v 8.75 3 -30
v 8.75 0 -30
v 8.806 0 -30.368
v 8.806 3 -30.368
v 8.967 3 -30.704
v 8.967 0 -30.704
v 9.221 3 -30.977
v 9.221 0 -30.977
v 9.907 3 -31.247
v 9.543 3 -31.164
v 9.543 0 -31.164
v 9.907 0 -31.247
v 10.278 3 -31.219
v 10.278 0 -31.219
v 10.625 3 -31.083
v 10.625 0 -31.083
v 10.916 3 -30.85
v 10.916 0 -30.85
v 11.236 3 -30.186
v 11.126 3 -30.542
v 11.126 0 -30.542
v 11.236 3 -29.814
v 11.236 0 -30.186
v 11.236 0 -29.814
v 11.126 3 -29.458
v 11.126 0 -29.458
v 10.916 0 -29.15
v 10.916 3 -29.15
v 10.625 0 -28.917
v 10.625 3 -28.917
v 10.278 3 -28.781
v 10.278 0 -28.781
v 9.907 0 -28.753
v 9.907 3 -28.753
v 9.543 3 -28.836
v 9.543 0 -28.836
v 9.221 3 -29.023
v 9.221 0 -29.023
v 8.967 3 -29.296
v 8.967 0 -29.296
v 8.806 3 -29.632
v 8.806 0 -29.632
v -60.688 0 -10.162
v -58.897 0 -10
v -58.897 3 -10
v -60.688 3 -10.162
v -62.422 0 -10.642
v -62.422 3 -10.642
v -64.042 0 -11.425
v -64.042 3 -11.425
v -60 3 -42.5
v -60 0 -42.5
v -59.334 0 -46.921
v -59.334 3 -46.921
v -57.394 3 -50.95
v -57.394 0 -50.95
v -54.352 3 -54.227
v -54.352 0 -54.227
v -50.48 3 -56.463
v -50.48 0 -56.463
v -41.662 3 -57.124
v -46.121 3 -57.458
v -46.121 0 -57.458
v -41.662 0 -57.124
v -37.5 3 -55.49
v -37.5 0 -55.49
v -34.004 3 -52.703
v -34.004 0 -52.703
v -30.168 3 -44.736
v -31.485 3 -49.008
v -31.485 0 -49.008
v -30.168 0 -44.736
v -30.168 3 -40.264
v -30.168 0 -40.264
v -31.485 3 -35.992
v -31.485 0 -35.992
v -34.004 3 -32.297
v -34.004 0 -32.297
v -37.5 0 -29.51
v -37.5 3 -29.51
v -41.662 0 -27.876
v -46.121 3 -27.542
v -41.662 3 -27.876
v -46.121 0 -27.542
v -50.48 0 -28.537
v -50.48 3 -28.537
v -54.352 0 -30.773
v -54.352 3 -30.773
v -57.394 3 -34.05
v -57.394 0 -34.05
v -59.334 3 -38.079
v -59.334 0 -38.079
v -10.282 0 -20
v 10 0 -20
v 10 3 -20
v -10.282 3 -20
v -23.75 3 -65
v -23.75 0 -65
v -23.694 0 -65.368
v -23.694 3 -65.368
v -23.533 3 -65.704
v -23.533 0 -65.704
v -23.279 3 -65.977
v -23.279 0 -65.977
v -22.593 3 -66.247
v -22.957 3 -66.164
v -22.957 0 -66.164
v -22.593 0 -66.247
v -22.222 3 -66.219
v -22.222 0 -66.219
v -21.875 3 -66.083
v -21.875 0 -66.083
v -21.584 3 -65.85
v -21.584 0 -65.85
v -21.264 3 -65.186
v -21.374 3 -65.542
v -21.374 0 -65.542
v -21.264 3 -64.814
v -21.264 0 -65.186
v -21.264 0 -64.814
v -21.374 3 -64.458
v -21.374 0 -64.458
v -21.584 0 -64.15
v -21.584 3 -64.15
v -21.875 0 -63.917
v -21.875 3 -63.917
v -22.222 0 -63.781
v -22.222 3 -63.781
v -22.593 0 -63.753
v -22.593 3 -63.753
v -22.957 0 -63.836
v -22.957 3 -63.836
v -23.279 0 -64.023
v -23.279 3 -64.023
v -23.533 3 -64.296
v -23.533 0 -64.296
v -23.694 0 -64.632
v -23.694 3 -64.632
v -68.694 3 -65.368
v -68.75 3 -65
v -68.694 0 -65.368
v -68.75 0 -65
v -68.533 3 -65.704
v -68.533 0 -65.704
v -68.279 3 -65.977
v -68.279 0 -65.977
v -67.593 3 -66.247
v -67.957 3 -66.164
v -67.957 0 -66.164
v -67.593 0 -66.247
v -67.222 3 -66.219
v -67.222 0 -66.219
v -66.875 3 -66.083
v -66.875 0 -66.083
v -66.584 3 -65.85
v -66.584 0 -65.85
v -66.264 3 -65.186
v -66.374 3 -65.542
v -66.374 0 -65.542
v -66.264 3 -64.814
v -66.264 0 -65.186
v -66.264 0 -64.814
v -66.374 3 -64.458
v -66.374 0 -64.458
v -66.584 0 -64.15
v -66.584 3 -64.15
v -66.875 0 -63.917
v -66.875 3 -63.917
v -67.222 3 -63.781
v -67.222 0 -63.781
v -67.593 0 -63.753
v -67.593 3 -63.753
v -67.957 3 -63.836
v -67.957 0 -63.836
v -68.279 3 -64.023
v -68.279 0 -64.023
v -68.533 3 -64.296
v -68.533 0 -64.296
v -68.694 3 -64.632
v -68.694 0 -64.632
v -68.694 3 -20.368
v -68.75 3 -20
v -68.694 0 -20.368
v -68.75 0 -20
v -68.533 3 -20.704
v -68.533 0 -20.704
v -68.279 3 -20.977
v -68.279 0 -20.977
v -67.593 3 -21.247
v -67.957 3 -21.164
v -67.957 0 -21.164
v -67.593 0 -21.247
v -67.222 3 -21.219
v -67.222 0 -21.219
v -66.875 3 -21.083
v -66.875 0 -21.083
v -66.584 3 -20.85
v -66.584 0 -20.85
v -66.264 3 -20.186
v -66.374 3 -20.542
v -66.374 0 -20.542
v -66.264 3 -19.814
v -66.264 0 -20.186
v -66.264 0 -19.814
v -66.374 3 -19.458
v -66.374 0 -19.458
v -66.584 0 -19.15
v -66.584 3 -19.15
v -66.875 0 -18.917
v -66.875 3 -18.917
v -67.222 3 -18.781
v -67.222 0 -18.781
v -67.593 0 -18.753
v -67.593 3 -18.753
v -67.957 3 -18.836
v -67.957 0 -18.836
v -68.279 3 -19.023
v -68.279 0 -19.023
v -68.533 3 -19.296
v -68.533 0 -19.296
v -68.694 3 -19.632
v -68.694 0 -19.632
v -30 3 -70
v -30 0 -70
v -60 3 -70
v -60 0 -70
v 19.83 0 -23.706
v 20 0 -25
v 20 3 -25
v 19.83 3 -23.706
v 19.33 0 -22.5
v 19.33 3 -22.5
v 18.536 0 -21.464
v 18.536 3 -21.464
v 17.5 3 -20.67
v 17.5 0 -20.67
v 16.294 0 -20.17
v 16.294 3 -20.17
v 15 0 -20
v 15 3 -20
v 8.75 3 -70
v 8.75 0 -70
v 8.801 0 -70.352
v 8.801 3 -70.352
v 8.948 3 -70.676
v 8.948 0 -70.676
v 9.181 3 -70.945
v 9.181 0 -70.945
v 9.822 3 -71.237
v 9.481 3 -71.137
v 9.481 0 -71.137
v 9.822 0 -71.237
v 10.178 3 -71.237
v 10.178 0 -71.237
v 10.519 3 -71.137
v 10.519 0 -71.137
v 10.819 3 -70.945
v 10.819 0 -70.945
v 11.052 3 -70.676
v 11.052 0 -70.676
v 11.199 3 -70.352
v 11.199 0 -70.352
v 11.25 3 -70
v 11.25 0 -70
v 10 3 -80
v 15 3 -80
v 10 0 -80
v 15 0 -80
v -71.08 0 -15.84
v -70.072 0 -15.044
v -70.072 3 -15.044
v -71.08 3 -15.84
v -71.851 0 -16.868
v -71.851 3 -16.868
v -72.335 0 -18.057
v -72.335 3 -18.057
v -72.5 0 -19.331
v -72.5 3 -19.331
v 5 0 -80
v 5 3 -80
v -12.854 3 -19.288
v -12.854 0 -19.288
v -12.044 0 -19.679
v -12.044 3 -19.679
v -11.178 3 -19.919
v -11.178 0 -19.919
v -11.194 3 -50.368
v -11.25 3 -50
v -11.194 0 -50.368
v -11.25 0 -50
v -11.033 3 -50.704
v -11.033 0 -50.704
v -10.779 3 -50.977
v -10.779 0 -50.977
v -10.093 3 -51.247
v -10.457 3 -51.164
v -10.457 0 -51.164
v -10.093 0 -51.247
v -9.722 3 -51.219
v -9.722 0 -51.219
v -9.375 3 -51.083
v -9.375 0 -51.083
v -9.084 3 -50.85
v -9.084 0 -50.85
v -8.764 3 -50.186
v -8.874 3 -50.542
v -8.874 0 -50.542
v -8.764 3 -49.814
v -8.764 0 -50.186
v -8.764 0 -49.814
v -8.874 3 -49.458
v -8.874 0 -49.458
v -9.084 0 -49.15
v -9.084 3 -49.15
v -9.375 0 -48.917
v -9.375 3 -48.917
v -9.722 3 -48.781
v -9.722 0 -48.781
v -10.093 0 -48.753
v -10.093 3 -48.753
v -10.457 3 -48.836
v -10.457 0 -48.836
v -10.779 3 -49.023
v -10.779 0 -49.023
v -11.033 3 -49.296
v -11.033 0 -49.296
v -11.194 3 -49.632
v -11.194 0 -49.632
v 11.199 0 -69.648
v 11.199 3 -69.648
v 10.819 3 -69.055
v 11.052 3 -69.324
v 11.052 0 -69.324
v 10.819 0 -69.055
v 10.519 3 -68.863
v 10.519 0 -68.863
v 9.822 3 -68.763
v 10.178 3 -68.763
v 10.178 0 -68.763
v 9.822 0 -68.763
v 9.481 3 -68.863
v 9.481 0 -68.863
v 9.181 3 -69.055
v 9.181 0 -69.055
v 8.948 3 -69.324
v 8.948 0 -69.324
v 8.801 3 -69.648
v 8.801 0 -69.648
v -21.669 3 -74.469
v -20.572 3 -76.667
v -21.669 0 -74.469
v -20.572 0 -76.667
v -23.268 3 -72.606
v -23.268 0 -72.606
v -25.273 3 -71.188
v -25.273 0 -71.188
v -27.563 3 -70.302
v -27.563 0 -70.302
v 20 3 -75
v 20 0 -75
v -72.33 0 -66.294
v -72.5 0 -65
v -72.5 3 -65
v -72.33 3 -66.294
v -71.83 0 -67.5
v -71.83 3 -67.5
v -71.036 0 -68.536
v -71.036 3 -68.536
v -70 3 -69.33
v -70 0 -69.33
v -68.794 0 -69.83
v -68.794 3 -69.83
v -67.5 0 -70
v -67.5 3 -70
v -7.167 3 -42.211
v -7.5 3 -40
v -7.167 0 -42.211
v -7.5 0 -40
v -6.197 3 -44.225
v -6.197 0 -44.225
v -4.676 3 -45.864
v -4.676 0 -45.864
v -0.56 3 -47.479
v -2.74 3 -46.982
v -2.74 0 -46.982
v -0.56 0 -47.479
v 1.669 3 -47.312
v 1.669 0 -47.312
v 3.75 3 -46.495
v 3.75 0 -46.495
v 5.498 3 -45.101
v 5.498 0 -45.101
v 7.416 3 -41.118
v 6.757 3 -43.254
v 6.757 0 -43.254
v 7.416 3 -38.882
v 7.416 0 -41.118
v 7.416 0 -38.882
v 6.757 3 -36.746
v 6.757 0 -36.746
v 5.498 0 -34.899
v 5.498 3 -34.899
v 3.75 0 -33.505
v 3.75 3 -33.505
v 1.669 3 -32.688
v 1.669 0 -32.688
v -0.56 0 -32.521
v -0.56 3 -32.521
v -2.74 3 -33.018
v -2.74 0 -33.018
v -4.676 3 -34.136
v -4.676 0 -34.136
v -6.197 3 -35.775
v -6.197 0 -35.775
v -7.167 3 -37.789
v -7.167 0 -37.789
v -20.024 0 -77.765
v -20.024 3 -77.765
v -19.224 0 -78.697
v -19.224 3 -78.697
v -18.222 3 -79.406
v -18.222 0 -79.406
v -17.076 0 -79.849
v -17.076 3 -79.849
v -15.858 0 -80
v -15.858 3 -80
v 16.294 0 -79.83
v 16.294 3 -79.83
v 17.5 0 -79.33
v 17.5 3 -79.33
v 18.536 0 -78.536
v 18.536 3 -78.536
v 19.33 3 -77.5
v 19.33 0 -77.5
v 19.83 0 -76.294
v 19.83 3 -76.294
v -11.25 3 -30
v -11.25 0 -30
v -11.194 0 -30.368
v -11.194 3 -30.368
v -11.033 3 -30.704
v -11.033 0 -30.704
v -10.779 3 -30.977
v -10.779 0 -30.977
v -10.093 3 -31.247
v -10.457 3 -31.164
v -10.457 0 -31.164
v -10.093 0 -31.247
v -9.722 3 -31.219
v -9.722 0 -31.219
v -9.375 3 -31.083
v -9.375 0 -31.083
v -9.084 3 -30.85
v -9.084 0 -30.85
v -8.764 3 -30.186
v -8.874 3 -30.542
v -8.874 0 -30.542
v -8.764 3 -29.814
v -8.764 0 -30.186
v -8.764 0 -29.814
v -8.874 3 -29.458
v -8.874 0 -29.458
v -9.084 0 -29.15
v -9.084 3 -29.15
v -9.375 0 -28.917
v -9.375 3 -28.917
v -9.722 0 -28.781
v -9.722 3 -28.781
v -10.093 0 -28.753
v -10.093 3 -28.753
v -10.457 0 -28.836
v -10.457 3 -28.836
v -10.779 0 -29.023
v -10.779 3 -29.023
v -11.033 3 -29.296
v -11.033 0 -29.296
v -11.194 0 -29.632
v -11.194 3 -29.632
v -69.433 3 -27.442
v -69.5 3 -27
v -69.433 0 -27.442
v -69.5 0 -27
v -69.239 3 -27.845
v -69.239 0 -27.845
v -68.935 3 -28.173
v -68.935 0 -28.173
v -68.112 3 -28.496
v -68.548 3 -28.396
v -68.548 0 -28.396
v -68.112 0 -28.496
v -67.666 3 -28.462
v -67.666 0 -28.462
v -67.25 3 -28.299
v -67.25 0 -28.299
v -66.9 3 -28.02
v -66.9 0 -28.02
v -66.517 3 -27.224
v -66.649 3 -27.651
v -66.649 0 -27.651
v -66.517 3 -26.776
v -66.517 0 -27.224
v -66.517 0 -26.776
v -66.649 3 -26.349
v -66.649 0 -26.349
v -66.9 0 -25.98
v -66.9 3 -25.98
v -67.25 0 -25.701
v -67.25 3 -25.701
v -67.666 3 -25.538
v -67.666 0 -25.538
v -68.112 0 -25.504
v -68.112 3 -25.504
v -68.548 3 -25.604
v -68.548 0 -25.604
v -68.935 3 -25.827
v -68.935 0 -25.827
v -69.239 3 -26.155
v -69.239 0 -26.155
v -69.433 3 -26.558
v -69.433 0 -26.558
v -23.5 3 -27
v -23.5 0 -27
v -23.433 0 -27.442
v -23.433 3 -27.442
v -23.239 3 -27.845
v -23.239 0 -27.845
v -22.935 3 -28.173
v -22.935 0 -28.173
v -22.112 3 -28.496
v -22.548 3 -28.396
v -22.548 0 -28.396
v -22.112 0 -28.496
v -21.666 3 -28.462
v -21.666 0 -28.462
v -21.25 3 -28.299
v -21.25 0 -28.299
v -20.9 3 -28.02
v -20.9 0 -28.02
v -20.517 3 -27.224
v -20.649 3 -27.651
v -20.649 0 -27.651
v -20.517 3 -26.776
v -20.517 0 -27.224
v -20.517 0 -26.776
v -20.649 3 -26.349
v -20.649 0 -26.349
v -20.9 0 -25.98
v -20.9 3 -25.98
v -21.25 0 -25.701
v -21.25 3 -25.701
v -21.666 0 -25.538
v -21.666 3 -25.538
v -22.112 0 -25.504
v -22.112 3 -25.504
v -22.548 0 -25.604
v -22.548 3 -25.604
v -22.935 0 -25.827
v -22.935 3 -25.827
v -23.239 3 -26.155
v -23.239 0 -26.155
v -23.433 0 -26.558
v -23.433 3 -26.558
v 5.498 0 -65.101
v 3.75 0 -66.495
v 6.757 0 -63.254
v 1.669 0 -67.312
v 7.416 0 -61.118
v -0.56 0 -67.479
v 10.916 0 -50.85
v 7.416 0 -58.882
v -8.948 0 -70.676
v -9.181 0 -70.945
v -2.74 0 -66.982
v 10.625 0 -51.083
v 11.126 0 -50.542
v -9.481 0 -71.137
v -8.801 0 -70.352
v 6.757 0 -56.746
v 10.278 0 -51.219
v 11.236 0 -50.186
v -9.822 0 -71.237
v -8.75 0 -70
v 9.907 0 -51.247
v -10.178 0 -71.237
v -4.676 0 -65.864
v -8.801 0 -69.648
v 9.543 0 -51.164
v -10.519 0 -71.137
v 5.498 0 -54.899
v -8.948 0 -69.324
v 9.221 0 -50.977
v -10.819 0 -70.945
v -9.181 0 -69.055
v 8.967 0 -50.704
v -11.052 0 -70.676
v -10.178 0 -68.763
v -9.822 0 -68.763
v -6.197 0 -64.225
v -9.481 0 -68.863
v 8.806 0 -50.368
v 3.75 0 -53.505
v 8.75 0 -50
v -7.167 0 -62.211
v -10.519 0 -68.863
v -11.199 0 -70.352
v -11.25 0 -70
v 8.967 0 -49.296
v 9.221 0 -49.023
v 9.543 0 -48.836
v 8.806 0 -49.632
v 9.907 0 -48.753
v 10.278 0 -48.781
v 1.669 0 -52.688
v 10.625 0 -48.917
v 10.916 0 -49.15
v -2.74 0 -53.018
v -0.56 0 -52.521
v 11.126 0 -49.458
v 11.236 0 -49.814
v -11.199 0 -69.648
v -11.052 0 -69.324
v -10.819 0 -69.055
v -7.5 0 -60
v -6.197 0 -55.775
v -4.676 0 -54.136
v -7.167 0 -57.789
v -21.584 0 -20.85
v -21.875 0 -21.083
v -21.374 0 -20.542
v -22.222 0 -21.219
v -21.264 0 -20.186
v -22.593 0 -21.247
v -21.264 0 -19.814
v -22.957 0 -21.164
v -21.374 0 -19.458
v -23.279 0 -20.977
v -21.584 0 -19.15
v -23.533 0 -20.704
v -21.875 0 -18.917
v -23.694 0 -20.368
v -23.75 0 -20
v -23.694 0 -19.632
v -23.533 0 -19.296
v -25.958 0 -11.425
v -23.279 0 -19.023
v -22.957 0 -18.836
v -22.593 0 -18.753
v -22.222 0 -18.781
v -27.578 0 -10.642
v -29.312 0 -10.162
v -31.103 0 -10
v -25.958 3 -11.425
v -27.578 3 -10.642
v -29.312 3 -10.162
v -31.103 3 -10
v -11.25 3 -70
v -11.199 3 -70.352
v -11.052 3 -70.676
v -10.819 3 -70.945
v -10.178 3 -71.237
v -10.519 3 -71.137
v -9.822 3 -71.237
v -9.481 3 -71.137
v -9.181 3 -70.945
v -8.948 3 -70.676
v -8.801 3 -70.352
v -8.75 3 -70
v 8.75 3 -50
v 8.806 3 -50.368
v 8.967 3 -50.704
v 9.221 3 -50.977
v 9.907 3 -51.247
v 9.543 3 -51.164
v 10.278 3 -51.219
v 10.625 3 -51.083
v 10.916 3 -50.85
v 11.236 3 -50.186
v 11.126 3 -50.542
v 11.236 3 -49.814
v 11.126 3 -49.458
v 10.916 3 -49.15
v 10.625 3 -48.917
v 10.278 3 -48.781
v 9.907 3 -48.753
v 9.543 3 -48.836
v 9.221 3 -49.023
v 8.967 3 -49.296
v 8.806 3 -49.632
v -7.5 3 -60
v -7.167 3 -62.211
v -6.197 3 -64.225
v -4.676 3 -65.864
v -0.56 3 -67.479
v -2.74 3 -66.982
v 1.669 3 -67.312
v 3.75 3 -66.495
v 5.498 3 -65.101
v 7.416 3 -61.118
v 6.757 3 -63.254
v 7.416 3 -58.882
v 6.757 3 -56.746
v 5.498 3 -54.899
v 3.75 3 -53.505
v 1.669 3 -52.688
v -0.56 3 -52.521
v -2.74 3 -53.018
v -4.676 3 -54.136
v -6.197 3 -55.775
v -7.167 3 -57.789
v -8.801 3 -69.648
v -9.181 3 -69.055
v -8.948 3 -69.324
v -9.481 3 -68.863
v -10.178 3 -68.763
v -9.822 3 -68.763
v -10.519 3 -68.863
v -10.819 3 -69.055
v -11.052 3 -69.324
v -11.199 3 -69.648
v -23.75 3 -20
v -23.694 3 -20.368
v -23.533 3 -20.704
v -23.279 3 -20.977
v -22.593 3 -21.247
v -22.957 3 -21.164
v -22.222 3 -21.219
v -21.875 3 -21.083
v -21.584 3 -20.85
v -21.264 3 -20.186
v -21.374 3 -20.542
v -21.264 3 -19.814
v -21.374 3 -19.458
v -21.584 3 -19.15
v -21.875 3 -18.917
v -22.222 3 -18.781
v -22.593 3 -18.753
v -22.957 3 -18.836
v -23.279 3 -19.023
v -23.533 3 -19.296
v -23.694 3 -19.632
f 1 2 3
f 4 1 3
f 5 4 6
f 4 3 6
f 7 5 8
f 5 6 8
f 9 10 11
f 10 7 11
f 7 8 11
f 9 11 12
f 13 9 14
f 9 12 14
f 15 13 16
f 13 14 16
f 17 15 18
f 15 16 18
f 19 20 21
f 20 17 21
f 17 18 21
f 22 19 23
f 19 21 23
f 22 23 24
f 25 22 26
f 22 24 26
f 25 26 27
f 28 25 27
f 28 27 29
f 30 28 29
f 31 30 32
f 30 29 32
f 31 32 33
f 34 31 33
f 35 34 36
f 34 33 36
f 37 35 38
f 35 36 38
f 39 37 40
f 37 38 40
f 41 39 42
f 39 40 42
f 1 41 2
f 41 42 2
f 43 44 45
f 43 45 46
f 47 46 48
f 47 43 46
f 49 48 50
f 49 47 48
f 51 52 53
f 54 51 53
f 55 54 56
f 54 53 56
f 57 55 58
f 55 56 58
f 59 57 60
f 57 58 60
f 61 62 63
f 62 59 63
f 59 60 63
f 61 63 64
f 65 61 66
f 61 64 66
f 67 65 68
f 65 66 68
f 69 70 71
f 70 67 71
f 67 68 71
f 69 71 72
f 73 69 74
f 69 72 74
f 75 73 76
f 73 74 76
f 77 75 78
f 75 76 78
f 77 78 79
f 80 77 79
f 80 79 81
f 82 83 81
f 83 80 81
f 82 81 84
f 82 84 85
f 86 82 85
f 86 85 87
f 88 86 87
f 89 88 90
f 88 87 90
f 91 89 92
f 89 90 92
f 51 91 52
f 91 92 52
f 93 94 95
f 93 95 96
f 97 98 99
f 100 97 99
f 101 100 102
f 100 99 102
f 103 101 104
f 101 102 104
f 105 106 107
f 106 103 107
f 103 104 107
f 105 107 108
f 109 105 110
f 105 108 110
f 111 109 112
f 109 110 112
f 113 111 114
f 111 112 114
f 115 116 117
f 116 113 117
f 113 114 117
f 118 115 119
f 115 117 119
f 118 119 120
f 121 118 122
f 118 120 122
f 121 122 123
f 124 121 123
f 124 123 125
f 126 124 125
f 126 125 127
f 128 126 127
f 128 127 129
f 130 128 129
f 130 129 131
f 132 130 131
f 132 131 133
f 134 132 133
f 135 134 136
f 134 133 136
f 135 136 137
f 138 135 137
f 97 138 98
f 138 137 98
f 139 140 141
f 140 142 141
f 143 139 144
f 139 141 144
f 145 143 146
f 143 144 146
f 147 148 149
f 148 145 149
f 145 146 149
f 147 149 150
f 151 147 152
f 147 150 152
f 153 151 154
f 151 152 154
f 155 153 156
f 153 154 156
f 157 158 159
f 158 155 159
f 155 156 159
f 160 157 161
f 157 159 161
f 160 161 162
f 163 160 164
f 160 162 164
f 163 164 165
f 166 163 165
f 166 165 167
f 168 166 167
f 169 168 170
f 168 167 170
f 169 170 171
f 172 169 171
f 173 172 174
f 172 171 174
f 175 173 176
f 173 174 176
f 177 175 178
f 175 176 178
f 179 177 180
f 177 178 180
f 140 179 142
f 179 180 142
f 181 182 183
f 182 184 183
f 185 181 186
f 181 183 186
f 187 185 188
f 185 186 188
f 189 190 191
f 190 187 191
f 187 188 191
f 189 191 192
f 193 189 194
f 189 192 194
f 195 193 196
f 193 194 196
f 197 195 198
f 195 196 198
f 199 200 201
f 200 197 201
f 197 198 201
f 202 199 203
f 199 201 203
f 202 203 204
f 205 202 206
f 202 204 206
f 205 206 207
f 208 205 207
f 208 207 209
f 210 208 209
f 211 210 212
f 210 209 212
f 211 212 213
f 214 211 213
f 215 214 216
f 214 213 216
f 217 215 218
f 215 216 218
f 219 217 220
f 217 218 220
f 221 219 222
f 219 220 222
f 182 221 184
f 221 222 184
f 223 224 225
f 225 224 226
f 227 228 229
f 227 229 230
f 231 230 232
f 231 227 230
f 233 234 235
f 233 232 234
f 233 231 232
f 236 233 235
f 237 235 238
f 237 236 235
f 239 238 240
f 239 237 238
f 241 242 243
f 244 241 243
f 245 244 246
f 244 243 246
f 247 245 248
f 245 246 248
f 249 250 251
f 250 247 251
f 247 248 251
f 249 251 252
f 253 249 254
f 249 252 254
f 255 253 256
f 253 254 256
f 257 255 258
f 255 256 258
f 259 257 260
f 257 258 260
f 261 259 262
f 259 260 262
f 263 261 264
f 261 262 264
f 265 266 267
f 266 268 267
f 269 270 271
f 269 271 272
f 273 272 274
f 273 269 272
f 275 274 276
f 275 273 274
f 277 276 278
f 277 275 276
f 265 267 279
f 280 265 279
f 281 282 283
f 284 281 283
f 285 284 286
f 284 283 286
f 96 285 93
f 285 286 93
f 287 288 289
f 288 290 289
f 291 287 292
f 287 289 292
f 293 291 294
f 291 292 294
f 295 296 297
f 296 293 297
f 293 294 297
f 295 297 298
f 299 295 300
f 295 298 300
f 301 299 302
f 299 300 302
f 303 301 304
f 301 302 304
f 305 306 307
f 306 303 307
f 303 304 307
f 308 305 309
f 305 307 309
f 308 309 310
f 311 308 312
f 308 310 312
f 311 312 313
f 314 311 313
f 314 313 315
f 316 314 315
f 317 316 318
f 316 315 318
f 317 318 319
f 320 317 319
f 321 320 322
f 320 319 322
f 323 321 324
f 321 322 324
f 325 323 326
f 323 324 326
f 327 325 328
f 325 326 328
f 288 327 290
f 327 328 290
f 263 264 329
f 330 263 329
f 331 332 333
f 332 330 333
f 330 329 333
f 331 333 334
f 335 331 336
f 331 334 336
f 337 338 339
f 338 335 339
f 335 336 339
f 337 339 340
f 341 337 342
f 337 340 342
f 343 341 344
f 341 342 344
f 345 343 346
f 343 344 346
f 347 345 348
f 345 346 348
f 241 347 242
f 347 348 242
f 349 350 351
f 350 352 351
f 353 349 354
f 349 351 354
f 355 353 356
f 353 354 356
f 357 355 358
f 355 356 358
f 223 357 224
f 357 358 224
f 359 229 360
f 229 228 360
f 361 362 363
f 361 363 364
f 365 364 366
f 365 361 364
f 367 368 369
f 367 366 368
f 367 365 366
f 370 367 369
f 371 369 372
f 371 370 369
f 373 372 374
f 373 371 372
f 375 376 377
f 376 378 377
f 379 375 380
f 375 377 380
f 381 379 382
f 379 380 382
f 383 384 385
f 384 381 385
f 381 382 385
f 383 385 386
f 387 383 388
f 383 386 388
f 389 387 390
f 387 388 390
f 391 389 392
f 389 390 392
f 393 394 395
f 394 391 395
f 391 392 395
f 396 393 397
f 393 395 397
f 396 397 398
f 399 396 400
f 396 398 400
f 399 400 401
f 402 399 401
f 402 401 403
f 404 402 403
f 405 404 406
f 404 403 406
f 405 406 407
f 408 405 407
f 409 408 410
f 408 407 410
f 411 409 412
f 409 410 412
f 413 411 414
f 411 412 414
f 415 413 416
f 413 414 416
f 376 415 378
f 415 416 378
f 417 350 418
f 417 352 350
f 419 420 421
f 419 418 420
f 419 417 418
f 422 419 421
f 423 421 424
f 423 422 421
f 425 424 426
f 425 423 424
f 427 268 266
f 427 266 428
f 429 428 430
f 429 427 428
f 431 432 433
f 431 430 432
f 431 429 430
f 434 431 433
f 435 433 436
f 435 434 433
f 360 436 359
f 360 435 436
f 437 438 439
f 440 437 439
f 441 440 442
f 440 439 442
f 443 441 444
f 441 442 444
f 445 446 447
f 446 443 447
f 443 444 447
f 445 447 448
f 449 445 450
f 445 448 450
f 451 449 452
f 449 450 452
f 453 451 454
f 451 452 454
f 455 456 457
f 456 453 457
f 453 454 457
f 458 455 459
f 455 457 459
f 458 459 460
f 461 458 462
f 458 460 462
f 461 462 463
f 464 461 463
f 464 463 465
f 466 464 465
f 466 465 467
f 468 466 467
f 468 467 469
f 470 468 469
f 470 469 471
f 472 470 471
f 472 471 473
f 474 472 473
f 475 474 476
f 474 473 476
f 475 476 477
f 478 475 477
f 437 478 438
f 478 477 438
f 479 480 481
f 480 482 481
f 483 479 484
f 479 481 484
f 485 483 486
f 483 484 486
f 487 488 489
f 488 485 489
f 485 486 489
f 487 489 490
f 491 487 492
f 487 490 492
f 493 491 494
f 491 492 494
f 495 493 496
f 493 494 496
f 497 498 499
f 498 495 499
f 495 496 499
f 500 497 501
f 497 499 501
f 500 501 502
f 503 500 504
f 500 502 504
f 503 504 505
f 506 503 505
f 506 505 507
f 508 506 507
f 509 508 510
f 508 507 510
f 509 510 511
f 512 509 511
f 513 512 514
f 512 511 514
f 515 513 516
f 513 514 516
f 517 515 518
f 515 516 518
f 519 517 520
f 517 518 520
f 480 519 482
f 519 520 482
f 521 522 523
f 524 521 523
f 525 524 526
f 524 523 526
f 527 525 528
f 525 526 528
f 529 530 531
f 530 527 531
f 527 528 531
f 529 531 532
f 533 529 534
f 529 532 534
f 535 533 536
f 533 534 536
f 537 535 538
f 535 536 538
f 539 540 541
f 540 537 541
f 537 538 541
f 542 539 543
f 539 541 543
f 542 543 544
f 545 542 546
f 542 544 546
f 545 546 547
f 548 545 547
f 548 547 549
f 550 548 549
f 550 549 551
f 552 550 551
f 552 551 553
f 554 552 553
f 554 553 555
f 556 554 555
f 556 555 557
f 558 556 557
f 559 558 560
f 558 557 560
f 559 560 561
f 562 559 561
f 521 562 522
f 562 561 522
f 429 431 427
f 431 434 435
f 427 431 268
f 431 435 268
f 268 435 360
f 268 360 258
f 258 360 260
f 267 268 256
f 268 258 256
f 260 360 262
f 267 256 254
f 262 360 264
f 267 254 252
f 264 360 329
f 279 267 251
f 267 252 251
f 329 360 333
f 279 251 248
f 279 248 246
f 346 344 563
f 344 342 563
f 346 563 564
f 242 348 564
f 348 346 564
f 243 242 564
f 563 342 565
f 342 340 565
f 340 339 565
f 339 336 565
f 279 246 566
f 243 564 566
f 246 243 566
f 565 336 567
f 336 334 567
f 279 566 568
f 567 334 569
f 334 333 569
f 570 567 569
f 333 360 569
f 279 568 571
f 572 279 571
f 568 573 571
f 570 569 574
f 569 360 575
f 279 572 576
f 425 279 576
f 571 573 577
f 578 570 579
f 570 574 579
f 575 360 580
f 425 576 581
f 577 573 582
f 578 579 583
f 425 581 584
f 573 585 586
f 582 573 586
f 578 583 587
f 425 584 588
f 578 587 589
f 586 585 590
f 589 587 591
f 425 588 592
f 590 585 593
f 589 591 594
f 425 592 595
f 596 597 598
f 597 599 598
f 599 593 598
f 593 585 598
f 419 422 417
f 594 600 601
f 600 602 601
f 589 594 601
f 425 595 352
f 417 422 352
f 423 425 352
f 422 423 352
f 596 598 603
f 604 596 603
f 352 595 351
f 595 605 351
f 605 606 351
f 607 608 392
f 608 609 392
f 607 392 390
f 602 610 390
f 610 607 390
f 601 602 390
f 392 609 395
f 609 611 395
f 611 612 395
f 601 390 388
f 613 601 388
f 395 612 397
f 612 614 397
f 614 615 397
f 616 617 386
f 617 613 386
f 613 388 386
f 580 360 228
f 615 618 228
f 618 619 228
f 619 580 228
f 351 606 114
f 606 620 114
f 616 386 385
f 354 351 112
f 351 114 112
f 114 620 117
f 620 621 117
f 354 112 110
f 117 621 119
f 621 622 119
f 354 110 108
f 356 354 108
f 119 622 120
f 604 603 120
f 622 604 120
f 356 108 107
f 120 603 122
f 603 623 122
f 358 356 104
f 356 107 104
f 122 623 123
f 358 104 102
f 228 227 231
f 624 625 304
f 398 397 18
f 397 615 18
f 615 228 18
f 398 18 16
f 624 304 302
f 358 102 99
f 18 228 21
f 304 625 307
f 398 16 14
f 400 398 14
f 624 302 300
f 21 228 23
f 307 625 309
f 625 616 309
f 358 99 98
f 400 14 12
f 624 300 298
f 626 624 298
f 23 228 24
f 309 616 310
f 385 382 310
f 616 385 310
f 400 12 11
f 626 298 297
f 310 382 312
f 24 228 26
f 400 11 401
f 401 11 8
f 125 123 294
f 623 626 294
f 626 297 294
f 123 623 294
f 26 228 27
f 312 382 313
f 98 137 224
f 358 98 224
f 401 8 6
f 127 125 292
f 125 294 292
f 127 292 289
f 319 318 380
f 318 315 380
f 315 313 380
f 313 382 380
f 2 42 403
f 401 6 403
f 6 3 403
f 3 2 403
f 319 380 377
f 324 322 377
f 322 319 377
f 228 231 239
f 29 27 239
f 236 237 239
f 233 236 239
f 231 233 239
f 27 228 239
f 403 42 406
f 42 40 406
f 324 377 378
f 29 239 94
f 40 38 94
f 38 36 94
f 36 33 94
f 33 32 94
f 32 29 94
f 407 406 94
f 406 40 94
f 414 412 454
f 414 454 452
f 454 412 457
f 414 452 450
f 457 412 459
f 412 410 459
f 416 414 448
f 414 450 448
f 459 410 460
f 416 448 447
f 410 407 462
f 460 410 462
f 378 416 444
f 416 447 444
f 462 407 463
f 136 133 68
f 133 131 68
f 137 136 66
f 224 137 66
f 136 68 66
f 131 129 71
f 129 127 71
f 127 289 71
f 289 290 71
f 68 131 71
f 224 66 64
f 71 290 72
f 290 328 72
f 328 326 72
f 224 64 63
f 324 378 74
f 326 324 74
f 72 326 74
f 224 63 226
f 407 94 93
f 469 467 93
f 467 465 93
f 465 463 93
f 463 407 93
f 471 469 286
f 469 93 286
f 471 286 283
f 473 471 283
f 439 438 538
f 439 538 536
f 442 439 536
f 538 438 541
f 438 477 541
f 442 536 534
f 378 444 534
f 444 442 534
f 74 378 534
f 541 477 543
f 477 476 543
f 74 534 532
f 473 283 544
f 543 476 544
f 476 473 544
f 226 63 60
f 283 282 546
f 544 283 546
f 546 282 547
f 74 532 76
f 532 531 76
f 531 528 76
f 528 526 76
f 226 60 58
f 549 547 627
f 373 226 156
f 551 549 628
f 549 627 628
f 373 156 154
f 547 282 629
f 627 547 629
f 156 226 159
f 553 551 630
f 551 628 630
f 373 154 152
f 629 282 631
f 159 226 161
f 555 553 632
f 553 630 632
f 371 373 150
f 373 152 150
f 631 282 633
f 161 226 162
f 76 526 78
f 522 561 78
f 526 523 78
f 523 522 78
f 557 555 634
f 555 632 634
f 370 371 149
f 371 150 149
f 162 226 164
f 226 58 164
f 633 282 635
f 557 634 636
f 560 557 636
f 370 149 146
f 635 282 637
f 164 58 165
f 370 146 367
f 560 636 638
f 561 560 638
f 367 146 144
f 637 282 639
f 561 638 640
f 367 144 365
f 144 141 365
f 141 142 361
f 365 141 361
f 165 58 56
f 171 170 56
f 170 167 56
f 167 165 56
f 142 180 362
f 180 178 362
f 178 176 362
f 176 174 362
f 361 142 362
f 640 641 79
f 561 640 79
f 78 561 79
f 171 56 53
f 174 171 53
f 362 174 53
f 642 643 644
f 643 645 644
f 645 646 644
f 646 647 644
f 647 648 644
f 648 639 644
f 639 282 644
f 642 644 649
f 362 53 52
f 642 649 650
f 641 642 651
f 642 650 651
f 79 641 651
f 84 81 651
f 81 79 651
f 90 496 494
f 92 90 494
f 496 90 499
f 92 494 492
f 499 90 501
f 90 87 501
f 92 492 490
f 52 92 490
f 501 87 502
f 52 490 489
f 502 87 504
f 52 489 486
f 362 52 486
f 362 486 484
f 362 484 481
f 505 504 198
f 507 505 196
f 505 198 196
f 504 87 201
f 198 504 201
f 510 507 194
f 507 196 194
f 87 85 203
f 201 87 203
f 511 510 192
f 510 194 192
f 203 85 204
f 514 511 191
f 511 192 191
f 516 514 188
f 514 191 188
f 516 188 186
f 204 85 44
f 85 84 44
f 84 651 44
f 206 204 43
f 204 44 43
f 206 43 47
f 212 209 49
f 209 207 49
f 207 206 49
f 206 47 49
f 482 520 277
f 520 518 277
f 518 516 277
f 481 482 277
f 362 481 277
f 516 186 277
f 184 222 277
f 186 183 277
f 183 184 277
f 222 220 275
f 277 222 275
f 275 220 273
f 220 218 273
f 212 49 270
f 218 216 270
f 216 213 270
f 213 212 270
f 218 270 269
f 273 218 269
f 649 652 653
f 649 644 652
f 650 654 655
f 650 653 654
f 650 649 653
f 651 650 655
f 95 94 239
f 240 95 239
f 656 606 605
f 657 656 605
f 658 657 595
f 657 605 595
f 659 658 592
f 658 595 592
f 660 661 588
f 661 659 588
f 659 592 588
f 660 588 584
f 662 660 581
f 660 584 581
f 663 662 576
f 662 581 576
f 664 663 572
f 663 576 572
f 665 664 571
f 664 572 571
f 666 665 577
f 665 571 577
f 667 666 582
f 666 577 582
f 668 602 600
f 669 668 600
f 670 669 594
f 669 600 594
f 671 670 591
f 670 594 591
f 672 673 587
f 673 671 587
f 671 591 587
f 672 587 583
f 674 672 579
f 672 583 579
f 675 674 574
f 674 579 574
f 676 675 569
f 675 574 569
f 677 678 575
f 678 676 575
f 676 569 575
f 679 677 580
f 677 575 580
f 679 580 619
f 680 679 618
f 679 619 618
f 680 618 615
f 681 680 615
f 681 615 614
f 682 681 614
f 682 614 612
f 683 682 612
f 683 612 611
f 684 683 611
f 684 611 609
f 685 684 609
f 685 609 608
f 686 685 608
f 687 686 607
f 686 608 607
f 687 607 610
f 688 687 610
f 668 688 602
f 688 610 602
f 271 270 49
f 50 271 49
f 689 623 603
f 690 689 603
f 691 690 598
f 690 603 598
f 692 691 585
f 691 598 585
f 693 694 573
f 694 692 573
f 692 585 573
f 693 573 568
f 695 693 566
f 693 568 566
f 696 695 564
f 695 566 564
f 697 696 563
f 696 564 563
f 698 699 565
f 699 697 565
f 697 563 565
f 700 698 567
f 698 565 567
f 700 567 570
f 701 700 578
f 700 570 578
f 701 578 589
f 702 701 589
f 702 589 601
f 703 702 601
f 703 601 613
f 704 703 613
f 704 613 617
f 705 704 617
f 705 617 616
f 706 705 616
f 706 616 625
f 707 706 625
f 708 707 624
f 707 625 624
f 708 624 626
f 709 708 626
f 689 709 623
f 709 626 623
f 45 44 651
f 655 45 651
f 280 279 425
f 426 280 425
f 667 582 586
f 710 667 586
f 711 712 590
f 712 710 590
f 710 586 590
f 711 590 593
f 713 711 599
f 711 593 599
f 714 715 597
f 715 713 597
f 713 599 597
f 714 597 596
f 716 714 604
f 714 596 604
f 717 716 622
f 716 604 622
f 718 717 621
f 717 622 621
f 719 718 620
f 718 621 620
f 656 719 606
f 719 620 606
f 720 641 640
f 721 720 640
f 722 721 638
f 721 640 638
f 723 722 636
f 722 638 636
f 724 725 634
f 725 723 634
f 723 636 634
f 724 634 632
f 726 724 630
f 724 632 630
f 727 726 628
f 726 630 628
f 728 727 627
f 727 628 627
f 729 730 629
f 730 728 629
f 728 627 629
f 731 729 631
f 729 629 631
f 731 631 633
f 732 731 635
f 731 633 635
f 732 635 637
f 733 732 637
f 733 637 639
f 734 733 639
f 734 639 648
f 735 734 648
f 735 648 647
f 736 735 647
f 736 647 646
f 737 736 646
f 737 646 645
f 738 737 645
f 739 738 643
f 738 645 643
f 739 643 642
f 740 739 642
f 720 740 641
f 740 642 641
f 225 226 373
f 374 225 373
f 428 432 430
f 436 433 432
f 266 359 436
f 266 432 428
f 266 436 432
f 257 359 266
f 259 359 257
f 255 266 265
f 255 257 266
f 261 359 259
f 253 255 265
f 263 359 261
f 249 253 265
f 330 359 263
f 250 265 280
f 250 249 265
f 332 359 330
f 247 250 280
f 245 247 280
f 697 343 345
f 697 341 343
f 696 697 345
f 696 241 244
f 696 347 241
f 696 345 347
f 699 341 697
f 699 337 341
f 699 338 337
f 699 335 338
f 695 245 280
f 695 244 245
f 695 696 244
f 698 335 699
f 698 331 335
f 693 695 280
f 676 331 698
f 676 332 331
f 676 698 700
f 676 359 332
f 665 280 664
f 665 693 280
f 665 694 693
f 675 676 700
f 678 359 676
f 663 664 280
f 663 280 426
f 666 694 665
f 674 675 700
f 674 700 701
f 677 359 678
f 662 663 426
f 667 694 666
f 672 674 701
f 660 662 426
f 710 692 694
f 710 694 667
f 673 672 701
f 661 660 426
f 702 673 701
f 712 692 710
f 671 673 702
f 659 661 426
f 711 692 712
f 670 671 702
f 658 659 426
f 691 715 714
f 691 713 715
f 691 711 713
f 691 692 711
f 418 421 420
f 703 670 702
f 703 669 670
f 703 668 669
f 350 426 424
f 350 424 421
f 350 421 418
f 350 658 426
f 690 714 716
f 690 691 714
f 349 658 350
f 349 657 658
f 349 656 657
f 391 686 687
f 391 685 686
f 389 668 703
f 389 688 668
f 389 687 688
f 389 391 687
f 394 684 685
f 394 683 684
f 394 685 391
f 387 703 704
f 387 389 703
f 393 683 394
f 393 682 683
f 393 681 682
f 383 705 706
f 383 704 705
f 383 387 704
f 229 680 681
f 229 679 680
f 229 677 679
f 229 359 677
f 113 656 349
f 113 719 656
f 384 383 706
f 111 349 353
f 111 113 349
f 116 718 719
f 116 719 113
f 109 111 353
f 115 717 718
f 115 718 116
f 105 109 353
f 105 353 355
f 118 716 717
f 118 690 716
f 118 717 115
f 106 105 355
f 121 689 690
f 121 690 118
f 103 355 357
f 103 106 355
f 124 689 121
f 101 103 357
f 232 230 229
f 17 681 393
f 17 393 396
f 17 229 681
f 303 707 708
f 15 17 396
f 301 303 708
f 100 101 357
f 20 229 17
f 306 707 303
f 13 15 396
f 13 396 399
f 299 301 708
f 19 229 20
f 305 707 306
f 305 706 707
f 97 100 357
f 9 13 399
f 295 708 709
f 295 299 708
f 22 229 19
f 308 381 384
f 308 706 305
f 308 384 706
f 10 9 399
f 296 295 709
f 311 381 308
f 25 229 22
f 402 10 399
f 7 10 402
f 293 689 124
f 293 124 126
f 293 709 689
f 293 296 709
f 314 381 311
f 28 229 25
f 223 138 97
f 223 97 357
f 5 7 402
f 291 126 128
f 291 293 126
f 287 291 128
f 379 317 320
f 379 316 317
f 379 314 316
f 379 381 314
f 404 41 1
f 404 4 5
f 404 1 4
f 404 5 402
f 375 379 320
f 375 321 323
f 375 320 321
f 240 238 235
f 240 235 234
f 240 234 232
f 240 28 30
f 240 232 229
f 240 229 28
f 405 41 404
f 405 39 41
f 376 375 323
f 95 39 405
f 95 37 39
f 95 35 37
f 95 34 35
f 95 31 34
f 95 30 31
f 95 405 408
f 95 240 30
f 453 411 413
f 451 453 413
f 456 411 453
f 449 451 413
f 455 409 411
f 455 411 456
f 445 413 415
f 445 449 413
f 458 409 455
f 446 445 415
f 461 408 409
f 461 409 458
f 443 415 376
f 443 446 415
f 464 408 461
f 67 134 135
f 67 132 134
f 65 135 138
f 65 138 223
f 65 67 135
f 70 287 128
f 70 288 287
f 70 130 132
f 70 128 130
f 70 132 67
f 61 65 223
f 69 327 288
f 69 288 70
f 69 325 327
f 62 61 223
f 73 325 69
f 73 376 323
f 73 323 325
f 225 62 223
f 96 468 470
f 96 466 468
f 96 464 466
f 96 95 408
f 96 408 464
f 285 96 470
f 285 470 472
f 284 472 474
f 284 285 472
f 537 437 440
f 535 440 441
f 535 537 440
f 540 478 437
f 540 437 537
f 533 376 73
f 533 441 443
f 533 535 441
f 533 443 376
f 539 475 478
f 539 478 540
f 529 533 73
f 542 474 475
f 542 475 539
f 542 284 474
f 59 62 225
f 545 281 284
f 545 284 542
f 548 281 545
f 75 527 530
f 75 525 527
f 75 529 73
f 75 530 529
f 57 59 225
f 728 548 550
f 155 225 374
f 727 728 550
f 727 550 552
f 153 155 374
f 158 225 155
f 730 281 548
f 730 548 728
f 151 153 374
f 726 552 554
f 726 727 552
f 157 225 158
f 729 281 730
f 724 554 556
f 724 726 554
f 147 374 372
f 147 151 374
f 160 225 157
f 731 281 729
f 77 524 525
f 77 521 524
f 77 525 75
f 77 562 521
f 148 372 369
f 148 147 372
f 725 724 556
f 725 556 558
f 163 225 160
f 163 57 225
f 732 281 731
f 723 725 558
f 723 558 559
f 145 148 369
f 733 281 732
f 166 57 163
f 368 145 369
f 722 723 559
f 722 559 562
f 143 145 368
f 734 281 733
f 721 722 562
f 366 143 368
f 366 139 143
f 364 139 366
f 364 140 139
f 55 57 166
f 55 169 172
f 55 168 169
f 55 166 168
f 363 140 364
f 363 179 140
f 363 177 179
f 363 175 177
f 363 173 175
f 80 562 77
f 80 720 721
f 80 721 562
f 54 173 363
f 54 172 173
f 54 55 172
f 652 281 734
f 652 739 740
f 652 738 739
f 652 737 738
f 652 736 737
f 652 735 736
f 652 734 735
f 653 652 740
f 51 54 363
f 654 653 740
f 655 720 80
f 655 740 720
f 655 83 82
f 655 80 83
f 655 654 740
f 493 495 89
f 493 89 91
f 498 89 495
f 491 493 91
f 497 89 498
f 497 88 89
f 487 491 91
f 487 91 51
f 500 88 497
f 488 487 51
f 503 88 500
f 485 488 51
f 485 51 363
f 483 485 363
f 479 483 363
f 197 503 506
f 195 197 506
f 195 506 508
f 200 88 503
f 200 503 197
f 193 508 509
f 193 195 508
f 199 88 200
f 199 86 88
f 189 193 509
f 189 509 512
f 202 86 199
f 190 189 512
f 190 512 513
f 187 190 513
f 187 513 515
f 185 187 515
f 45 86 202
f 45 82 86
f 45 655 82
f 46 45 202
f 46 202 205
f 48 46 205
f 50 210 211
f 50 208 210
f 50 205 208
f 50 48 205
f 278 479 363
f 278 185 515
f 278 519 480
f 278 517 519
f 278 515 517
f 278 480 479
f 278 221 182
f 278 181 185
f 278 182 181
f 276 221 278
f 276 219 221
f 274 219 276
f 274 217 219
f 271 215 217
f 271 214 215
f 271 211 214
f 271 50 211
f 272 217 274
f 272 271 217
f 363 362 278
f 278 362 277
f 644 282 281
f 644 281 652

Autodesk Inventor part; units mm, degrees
ref_plane "YZ Plane" through (0, 0, 0) normal (1, 0, 0) x (0, 1, 0)
ref_plane "XZ Plane" through (0, 0, 0) normal (0, 1, 0) x (-1, 0, 0)
ref_plane "XY Plane" through (0, 0, 0) normal (0, 0, 1) x (1, 0, 0)
sketch "Sketch1" plane through (0, 0, 0) normal (0, 1, 0) x (-1, 0, 0)
  line L0 (10, 0) -> (80, 0)
  line L1 (90, -32.6619) -> (90, -167.3381)
  line L2 (67, -200) -> (23, -200)
  line L3 (0, -167.3381) -> (0, -85)
  line L4 (68, -27) -> (68, -173) construction
  line L5 (68, -173) -> (22, -173) construction
  line L6 (22, -173) -> (22, -27) construction
  circle A0 centre (68, -27) radius 1.5
  circle A1 centre (68, -173) radius 1.5
  circle A2 centre (22, -173) radius 1.5
  circle A3 centre (22, -27) radius 1.5
  line L7 (30, -70) -> (60, -70)
  line L8 (70, -80) -> (70, -120)
  line L9 (60, -130) -> (30, -130)
  line L10 (20, -120) -> (20, -80)
  arc A4 (70, -80) -> (60, -70) centre (60, -80) ccw
  arc A5 (60, -130) -> (70, -120) centre (60, -120) ccw
  arc A6 (20, -120) -> (30, -130) centre (30, -120) ccw
  arc A7 (30, -70) -> (20.5719, -76.6667) centre (30, -80) ccw
  arc A8 (90, -10) -> (80, 0) centre (80, -10) ccw
  arc A9 (0, -190) -> (10, -200) centre (10, -190) ccw
  arc A10 (80, -200) -> (90, -190) centre (80, -190) ccw
  arc A11 (10, 0) -> (0, -10) centre (10, -10) ccw
  circle A12 centre (80, -10) radius 1.25
  circle A13 centre (80, -30) radius 1.25
  circle A14 centre (80, -50) radius 1.25
  circle A15 centre (80, -70) radius 1.25
  circle A16 centre (80, -90) radius 1.25
  circle A17 centre (80, -110) radius 1.25
  circle A18 centre (80, -130) radius 1.25
  circle A19 centre (80, -150) radius 1.25
  circle A20 centre (80, -170) radius 1.25
  circle A21 centre (80, -190) radius 1.25
  circle A22 centre (10, -10) radius 1.25
  circle A23 centre (10, -30) radius 1.25
  circle A24 centre (10, -50) radius 1.25
  circle A25 centre (10, -70) radius 1.25
  circle A26 centre (10, -90) radius 1.25
  circle A27 centre (10, -110) radius 1.25
  circle A28 centre (10, -130) radius 1.25
  circle A29 centre (10, -150) radius 1.25
  circle A30 centre (10, -170) radius 1.25
  circle A31 centre (10, -190) radius 1.25
  circle A32 centre (81, -111) radius 3.5
  circle A33 centre (81.25, -89) radius 3.5
  circle A34 centre (9, -111) radius 3.5
  circle A35 centre (9, -89) radius 3.5
  line L11 (70.0725, -15.0435) -> (64.0418, -11.4251)
  line L12 (12.8542, -19.2875) -> (25.9582, -11.4251)
  arc A36 (90, -32.6619) -> (85.145, -24.087) centre (80, -32.6619) ccw
  arc A37 (4.855, -24.087) -> (0, -32.6619) centre (10, -32.6619) ccw construction
  circle A38 centre (67.5, -65) radius 1.25
  circle A39 centre (22.5, -65) radius 1.25
  line L13 (-15, -70) -> (15, -70)
  circle A40 centre (67.5, -20) radius 1.25
  line L14 (30, -25) -> (60, -25)
  circle A41 centre (22.5, -20) radius 1.25
  line L15 (-15, -25) -> (15, -25) construction
  line L16 (58.8968, -10) -> (31.1032, -10)
  arc A42 (64.0418, -11.4251) -> (58.8968, -10) centre (58.8968, -20) ccw
  arc A43 (31.1032, -10) -> (25.9582, -11.4251) centre (31.1032, -20) ccw
  line L17 (90, -200) -> (72, -200) construction
  line L18 (72, -195) -> (72, -185)
  line L19 (77, -180) -> (85, -180)
  line L20 (90, -175) -> (90, -167.3381)
  line L21 (0, -200) -> (18, -200) construction
  line L22 (18, -195) -> (18, -185)
  line L23 (13, -180) -> (5, -180)
  line L24 (0, -175) -> (0, -167.3381)
  arc A44 (77, -180) -> (72, -185) centre (77, -185) ccw
  arc A45 (85, -180) -> (90, -175) centre (85, -175) ccw
  arc A46 (0, -175) -> (5, -180) centre (5, -175) ccw
  arc A47 (18, -185) -> (13, -180) centre (13, -185) ccw
  arc A48 (67, -200) -> (72, -195) centre (67, -195) ccw
  arc A49 (18, -195) -> (23, -200) centre (23, -195) ccw
  circle A50 centre (69.1385, -144.2) radius 1.25
  circle A51 centre (20.8615, -144.2) radius 1.25
  circle A52 centre (53.8985, -195) radius 1.25
  line L25 (10, -30) -> (-10, -30) construction
  line L26 (-10, -30) -> (-10, -50) construction
  line L27 (-10, -50) -> (10, -50) construction
  line L28 (10, -50) -> (10, -30) construction
  circle A53 centre (-10, -50) radius 1.25
  circle A54 centre (-10, -30) radius 1.25
  line L29 (-10, -30) -> (-10, -20) construction
  line L30 (-10, -20) -> (10.2817, -20)
  line L31 (-10, -20) -> (-15, -20)
  line L32 (-20, -25) -> (-20, -75)
  line L33 (-15, -80) -> (-5, -80)
  arc A55 (-15, -20) -> (-20, -25) centre (-15, -25) ccw
  arc A56 (-20, -75) -> (-15, -80) centre (-15, -75) ccw
  arc A57 (0, -85) -> (-5, -80) centre (-5, -85) ccw
  arc A58 (10.2817, -20) -> (12.8542, -19.2875) centre (10.2817, -15) ccw
  line L34 (-10, -50) -> (-10, -70) construction
  circle A59 centre (-10, -70) radius 1.25
  line L35 (-10, -80) -> (15.8579, -80)
  line L36 (60, -70) -> (67.5, -70)
  line L37 (72.5, -65) -> (72.5, -19.331)
  arc A60 (72.5, -19.331) -> (70.0725, -15.0435) centre (67.5, -19.331) ccw
  arc A61 (67.5, -70) -> (72.5, -65) centre (67.5, -65) ccw
  arc A62 (15.8579, -80) -> (20.5719, -76.6667) centre (15.8579, -75) ccw
  line L38 (10, -70) -> (-10, -50) construction
  line L39 (10, -30) -> (-10, -50) construction
  circle A63 centre (0, -60) radius 7.5
  circle A64 centre (0, -40) radius 7.5
  line L40 (67.5, -65) -> (22.5, -20) construction
  circle A65 centre (45, -42.5) radius 15
  point P0 (0, 0)
  point P1 (90, 0)
  point P2 (70, -130)
  point P3 (70, -70)
  point P4 (20, -130)
  point P5 (45, 0)
  point P6 (45, -200)
  point P7 (25, -70)
  point P8 (70, -25)
  point P9 (25, -25)
  point P10 (72, -180)
  point P11 (-20, -20)
  point P12 (-20, -80)
  point P13 (72.5, -70)
  dimension "d0" = 90
  dimension "d1" = 200
  dimension "d2" = 46
  dimension "d4" = 22
  dimension "d5" = 27
  dimension "d7" = 3
  dimension "d8" = 3
  dimension "d10" = 50
  dimension "d11" = 60
  dimension "d12" = 20
  dimension "d13" = 70
  dimension "d14" = 10
  dimension "d15" = 10
  dimension "d16" = 2.5
  dimension "d19" = 20
  dimension "d24" = 2.5
  dimension "d27" = 20
  dimension "d34" = 7
  dimension "d35" = 7
  dimension "d36" = 7
  dimension "d37" = 7
  dimension "d38" = 72
  dimension "d39" = 22
  dimension "d40" = 9
  dimension "d41" = 89
  dimension "d42" = 22
  dimension "d43" = 72
  dimension "d46" = 10
  dimension "d48" = 2.5
  dimension "d51" = 45
  dimension "d54" = 45
  dimension "d57" = 22.5
  dimension "d58" = 5
  dimension "d71" = 18
  dimension "d72" = 20
  dimension "d73" = 18
  dimension "d74" = 5
  dimension "d75" = 5
  dimension "d76" = 2.5
  dimension "d77" = 2.5
  dimension "d78" = 0
  dimension "d79" = 48.277
  dimension "d81" = 20.8615
  dimension "d82" = 2.5
  dimension "d83" = 15.24
  dimension "d84" = 50.8
  dimension "d85" = 5
  dimension "d86" = 20
  dimension "d87" = 20
  dimension "d88" = 2.5
  dimension "d89" = 2.5
  dimension "d92" = 10
  dimension "d93" = 10
  dimension "d94" = 60
  dimension "d95" = 5
  dimension "d96" = 5
  dimension "d97" = 20
  dimension "d98" = 2.5
  dimension "d99" = 12.5
  dimension "d100" = 5
  dimension "d101" = 5
  dimension "d102" = 15
  dimension "d103" = 15
  dimension "d104" = 30
extrude "Extrusion2" add sketch "Sketch1" along normal blind 3 contours A7 A62 L35 L33 A56 L32 A55 L31 L30 A58 L12 A43 L16 A42 L11 A60 L37 A61 L36 L7
equation "\"d4\" = -0.5 * d2 + 0.5 * d0"
equation "\"d5\" = -0.5 * d3 + 0.5 * d1"
equation "\"d12\" = -0.5 * d10 + 0.5 * d0"
equation "\"d13\" = -0.5 * d11 + 0.5 * d1"
equation "\"d40\" = -0.5 * d38 + 0.5 * d0"
equation "\"d41\" = -0.5 * d39 + 0.5 * d1"
equation "\"d57\" = -0.5 * d51 + 0.5 * d0"
equation "\"d81\" = -0.5 * d79 + 0.5 * d0"
equation "\"d3\" = 146"
properties part number "TransmissionDeck" material "Polycarbonate, Clear"
